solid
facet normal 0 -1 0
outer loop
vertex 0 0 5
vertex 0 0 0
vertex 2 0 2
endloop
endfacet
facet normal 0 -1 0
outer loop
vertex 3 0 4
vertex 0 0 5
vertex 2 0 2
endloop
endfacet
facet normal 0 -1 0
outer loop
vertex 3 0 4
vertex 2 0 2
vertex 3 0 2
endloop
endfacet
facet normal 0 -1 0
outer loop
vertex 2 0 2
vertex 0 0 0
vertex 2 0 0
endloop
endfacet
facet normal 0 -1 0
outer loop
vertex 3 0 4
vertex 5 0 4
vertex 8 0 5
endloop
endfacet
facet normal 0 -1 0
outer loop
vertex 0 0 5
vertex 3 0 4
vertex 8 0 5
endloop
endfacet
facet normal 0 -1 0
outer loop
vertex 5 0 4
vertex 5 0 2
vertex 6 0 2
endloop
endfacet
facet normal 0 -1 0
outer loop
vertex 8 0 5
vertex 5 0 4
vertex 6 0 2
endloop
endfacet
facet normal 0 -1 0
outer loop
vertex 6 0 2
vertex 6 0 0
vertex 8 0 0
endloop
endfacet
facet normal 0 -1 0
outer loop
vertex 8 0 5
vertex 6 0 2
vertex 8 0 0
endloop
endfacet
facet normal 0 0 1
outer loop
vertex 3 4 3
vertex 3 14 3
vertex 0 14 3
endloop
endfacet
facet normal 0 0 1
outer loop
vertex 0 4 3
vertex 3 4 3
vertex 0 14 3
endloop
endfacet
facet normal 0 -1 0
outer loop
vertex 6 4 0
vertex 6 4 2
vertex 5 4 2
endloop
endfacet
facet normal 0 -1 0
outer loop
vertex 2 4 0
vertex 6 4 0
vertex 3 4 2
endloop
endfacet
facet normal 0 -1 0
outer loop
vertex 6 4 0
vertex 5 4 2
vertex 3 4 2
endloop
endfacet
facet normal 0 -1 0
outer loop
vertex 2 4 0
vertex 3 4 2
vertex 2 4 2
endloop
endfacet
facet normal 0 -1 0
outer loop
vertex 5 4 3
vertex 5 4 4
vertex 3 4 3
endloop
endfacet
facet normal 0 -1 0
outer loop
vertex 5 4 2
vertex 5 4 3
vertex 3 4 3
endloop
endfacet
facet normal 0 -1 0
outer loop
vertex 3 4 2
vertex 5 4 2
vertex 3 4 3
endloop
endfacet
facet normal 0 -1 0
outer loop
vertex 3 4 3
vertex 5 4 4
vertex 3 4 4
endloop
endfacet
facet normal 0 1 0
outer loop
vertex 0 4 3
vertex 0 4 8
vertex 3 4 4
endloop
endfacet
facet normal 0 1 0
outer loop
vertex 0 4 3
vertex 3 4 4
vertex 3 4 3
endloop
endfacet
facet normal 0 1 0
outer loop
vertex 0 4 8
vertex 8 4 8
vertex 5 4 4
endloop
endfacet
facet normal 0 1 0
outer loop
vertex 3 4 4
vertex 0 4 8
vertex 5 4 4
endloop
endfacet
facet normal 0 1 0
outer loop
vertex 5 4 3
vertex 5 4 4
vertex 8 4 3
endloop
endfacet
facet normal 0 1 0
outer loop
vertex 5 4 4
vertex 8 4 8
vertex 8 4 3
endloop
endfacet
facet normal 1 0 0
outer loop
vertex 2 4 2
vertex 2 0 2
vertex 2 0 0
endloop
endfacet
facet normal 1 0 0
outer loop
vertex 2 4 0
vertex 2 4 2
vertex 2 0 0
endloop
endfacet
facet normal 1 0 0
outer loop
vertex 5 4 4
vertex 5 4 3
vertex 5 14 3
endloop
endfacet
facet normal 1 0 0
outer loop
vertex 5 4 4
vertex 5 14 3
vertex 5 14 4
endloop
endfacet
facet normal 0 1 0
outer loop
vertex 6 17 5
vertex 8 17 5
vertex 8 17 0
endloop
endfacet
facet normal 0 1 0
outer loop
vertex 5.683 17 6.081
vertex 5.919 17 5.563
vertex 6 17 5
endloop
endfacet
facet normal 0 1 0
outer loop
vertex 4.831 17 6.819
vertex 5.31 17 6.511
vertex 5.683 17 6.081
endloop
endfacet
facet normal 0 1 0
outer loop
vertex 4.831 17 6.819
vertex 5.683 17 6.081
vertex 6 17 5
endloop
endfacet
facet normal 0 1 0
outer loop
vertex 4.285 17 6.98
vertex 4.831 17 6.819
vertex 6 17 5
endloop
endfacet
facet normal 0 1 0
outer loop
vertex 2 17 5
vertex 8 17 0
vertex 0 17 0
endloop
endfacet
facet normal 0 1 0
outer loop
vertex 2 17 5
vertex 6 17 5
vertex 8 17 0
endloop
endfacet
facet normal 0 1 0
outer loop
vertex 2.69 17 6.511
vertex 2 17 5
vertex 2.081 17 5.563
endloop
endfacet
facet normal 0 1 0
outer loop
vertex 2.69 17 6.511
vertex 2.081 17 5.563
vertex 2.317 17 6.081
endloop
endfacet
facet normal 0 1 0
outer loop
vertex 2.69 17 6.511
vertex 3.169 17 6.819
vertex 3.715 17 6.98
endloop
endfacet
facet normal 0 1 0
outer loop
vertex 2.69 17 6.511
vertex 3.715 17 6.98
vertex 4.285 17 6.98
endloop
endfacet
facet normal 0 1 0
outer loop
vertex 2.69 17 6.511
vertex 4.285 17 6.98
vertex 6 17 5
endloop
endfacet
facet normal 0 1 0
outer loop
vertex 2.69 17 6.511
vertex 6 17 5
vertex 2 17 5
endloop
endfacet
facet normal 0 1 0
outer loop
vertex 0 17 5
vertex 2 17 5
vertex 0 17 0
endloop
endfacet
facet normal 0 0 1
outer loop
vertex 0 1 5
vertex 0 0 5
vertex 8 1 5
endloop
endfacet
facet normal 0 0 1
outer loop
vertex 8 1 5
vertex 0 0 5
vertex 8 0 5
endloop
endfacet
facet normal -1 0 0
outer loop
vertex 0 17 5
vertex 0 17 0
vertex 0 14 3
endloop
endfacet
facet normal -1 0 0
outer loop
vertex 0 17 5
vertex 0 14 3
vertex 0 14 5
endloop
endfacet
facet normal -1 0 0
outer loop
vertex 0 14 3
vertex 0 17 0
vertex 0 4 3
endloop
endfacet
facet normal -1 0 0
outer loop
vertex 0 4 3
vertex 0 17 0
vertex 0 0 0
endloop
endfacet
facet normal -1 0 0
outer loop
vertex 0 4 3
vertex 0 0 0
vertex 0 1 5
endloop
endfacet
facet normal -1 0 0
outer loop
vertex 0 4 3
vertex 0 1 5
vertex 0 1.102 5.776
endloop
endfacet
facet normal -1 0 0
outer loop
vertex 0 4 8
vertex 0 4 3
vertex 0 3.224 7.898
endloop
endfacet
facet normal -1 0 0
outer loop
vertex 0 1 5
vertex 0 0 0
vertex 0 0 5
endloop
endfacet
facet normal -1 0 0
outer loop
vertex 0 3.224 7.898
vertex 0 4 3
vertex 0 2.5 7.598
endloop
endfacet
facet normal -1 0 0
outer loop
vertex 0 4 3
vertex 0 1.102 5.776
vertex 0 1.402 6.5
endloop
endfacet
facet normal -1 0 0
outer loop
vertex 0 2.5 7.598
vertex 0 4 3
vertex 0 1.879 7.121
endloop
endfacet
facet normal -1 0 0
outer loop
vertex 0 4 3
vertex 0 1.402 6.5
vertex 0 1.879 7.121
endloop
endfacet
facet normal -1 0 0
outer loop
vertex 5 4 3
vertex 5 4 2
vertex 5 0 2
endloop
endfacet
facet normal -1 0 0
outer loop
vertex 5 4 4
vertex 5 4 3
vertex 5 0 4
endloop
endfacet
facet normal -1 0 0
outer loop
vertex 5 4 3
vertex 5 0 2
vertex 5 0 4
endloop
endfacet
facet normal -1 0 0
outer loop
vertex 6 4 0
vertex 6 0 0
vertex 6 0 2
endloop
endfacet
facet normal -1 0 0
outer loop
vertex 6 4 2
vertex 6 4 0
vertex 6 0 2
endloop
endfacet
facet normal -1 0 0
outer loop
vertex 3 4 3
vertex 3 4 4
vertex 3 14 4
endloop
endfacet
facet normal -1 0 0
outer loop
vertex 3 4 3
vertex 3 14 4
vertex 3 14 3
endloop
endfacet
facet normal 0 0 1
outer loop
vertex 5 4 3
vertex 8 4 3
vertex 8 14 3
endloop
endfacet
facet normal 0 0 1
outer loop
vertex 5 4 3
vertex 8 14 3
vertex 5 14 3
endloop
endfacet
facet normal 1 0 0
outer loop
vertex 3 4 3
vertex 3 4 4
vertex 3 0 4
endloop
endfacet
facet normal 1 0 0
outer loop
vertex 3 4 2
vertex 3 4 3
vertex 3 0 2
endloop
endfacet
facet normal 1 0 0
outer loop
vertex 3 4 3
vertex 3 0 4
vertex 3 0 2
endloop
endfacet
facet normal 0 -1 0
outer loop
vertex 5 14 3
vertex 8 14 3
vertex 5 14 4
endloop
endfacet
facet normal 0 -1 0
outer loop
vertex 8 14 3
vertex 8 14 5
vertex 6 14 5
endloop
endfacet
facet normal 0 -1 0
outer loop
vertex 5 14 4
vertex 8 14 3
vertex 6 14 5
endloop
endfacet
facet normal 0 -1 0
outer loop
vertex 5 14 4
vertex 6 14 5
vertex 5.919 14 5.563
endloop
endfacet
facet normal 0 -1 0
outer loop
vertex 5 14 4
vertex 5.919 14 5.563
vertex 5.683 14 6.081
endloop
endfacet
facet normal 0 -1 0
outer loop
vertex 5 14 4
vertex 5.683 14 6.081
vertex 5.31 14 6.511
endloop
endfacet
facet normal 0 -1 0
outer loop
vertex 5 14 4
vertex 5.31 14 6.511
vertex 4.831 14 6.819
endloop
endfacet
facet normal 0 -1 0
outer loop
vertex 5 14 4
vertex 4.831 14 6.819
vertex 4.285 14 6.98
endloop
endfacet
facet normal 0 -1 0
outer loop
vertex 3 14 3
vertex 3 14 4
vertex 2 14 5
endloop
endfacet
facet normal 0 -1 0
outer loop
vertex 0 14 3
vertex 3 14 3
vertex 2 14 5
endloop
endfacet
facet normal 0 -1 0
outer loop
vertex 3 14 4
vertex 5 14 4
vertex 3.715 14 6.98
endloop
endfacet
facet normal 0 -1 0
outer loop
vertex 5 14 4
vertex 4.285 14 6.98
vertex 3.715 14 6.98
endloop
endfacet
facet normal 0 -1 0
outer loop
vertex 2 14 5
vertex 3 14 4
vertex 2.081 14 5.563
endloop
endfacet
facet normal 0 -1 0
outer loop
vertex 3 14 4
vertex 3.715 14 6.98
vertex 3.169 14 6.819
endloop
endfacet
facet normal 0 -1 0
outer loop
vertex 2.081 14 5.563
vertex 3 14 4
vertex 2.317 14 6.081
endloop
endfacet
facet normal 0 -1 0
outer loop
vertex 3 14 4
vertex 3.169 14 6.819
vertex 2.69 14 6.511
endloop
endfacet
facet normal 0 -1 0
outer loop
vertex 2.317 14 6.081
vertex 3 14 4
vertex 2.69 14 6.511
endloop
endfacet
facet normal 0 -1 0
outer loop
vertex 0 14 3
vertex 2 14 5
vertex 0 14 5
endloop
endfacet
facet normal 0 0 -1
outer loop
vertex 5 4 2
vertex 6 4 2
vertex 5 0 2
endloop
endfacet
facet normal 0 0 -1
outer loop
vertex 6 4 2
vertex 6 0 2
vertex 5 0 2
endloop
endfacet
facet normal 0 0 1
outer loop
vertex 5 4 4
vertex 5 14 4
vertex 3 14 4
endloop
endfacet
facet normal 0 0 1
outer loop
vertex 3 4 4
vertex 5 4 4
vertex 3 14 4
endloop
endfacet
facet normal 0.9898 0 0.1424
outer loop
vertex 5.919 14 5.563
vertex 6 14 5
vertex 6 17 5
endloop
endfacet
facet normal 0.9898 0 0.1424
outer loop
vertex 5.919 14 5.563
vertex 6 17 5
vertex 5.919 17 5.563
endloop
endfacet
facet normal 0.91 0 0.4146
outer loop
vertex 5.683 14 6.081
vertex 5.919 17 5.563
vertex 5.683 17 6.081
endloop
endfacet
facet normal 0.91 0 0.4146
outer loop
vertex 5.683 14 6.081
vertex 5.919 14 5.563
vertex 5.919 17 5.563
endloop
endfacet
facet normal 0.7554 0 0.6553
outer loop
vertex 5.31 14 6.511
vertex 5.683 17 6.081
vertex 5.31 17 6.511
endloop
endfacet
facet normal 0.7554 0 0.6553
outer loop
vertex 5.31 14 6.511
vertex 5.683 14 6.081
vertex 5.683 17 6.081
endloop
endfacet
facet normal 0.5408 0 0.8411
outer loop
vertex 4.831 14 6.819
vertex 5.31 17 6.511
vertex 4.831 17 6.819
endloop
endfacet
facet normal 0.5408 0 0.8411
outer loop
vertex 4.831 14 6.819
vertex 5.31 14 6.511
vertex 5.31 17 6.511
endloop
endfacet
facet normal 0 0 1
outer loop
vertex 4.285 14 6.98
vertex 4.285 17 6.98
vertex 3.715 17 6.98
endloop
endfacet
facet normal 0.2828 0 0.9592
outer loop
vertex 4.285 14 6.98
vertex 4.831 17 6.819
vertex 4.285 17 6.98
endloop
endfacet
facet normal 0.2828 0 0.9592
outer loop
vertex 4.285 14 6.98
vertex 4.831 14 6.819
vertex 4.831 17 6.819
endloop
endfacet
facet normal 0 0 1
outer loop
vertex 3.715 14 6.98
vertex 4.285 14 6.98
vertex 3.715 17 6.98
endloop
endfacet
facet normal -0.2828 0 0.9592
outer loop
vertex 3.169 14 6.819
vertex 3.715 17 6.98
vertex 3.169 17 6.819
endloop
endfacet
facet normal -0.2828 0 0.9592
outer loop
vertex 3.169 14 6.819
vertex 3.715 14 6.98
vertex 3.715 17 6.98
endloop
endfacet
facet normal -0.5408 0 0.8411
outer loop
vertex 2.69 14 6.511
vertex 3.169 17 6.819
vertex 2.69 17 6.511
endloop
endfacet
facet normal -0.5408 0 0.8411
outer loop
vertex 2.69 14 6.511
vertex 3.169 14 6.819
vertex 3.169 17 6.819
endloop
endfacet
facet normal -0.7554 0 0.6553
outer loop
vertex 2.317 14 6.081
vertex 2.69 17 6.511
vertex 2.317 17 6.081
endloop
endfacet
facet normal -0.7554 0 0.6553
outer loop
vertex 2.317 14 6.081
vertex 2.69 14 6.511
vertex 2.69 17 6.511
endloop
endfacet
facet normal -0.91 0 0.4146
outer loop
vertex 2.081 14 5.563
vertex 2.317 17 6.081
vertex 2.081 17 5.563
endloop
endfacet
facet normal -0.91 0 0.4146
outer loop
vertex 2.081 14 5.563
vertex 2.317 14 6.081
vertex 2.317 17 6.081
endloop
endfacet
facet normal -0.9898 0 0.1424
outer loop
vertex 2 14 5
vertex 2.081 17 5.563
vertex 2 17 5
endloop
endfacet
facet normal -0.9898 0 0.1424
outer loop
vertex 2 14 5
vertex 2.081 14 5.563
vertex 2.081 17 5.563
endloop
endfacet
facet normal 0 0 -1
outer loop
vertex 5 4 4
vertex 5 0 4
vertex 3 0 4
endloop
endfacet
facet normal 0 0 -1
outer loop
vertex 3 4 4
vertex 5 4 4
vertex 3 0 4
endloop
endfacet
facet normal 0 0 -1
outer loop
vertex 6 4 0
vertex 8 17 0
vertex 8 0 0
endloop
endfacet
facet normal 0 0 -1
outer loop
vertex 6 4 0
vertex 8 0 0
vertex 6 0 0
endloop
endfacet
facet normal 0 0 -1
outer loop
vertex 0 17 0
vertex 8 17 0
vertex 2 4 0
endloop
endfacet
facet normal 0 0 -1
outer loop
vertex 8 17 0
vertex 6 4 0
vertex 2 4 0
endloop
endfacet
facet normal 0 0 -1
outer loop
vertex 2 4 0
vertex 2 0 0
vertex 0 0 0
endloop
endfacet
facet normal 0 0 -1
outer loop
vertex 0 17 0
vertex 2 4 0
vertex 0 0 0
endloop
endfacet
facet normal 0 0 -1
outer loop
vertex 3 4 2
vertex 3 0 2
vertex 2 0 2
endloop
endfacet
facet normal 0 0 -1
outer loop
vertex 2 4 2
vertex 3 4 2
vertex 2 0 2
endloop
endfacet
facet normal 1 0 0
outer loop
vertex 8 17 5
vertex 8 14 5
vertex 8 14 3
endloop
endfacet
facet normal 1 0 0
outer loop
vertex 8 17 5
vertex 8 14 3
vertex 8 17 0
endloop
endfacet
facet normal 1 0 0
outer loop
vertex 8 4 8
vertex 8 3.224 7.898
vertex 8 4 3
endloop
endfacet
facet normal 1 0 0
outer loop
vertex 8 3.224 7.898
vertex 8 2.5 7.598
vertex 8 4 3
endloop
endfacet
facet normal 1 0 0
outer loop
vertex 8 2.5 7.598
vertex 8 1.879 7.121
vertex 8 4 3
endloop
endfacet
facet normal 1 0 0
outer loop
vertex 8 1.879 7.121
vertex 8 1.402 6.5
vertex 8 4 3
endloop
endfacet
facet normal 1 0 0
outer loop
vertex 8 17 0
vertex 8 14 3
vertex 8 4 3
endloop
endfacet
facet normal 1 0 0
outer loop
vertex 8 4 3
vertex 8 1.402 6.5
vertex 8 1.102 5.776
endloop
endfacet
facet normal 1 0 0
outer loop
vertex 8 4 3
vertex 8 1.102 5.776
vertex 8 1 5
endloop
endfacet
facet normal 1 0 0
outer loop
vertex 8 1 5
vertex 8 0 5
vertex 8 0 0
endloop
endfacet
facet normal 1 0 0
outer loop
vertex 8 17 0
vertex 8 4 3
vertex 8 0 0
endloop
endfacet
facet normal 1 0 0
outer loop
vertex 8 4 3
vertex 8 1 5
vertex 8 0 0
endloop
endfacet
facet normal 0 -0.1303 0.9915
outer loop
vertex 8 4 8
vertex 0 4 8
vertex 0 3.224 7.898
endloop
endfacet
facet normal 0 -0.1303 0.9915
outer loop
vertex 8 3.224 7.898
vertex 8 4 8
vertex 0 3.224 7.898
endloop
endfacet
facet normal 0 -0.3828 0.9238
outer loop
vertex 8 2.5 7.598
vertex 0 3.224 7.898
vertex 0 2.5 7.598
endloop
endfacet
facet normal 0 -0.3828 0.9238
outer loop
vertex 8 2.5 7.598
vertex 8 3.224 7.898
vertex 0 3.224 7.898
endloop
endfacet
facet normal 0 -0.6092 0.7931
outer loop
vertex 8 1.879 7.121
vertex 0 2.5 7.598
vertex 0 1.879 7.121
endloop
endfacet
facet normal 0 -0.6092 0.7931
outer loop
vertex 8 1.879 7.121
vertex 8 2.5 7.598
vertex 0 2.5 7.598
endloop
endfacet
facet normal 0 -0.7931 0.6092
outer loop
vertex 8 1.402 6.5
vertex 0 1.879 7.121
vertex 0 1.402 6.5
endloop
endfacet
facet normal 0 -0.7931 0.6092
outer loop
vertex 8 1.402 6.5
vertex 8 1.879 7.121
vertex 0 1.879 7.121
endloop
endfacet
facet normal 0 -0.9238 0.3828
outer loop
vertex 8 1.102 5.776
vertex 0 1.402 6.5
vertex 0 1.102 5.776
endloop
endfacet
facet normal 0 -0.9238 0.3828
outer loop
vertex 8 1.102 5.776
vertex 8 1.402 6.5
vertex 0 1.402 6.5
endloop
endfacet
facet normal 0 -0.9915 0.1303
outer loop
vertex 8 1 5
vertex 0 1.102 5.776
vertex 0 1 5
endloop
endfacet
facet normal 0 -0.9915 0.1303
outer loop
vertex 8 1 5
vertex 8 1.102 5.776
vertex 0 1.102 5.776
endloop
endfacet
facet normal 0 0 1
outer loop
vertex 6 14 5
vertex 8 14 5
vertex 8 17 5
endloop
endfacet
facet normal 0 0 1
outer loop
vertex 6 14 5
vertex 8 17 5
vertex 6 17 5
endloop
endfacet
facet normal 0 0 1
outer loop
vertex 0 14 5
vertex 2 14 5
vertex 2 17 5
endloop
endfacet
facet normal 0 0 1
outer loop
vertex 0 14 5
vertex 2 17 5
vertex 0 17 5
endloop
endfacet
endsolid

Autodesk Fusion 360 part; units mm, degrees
sketch "Sketch1" plane through (0, 0, 0) normal (0, 1, 0) x (1, 0, 0)
  line L0 (0, 0) -> (0, -5)
  line L1 (0, -5) -> (8, -5)
  line L2 (8, -5) -> (8, 0)
  line L3 (8, 0) -> (6, 0)
  line L4 (6, 0) -> (6, -2)
  line L5 (6, -2) -> (5, -2)
  line L6 (5, -2) -> (5, -4)
  line L7 (5, -4) -> (3, -4)
  line L8 (3, -4) -> (3, -2)
  line L9 (3, -2) -> (2, -2)
  line L10 (2, -2) -> (2, 0)
  line L11 (2, 0) -> (0, 0)
  dimension "d1" = 8
  dimension "d2" = 2
extrude "Extrude1" add sketch "Sketch1" along normal blind 1
sketch "Sketch2" plane through (8, 0, 0) normal (1, 0, 0) x (0, 1, 0)
  line L0 (0, 5) -> (0, 0)
  line L1 (0, 0) -> (1, 0)
  line L2 (1, 0) -> (1, 5)
  line L3 (1, 5) -> (0, 5)
  line L4 (1, 5) -> (4, 5)
  line L5 (4, 5) -> (4, 8)
  arc A0 (4, 8) -> (1, 5) centre (4, 5) ccw
  line L6 (4, 5) -> (4, 0)
  line L7 (4, 0) -> (1, 0)
  dimension "d5" = 3
  dimension "d6" = 3
extrude "Extrude2" add sketch "Sketch2" against normal blind 8 contours L2 L4 L6 L7 | L4 L5 A0
extrude "Extrude3" cut 1 faces at (4.3333, 1, 0.6667) along direction (0, 1, 0) blind 4.5
sketch "Sketch3" plane through (0, 4, 0) normal (0, 1, 0) x (-1, 0, 0)
  line L0 (-2, 2) -> (-2, 0)
  line L1 (-2, 0) -> (0, 0)
  line L2 (0, 0) -> (0, 8)
  line L3 (0, 8) -> (-8, 8)
  line L4 (-8, 8) -> (-8, 0)
  line L5 (-8, 0) -> (-6, 0)
  line L6 (-6, 0) -> (-6, 2)
  line L7 (-6, 2) -> (-5, 2)
  line L8 (-5, 2) -> (-5, 4)
  line L9 (-5, 4) -> (-3, 4)
  line L10 (-3, 4) -> (-3, 2)
  line L11 (-3, 2) -> (-2, 2)
  line L12 (-8, 0) -> (-8, 3)
  line L13 (-8, 3) -> (-5, 3)
  line L14 (-5, 3) -> (-5, 4)
  line L15 (-3, 4) -> (-3, 3)
  line L16 (-3, 3) -> (0, 3)
  line L17 (-3, 4) -> (-5, 4)
  line L18 (0, 3) -> (0, 0)
  line L19 (-8, 0) -> (0, 0)
  dimension "d11" = 3
  dimension "d12" = 3
extrude "Extrude4" add sketch "Sketch3" along normal blind 10 contours L0 L1 L2 L10 L11 L16 L18 L19 | L0 L6 L7 L8 L9 L10 L11 L14 L15 L17 L19 | L4 L5 L6 L7 L8 L12 L13 L19
sketch "Sketch4" plane through (0, 14, 0) normal (0, 1, 0) x (-1, 0, 0)
  line L0 (-8, 3) -> (-8, 0)
  line L1 (-8, 0) -> (0, 0)
  line L2 (0, 0) -> (0, 3)
  line L3 (0, 3) -> (-3, 3)
  line L4 (-3, 3) -> (-3, 4)
  line L5 (-3, 4) -> (-5, 4)
  line L6 (-5, 4) -> (-5, 3)
  line L7 (-5, 3) -> (-8, 3)
  line L8 (-8, 0) -> (-8, 5)
  line L9 (-8, 5) -> (-6, 5)
  line L10 (-6, 5) -> (-4, 5)
  arc A0 (-2, 5) -> (-6, 5) centre (-4, 5) ccw
  line L11 (-2, 5) -> (0, 5)
  line L12 (0, 5) -> (0, 0)
  dimension "d15" = 5
  dimension "d16" = 2
extrude "Extrude5" add sketch "Sketch4" along normal blind 3
